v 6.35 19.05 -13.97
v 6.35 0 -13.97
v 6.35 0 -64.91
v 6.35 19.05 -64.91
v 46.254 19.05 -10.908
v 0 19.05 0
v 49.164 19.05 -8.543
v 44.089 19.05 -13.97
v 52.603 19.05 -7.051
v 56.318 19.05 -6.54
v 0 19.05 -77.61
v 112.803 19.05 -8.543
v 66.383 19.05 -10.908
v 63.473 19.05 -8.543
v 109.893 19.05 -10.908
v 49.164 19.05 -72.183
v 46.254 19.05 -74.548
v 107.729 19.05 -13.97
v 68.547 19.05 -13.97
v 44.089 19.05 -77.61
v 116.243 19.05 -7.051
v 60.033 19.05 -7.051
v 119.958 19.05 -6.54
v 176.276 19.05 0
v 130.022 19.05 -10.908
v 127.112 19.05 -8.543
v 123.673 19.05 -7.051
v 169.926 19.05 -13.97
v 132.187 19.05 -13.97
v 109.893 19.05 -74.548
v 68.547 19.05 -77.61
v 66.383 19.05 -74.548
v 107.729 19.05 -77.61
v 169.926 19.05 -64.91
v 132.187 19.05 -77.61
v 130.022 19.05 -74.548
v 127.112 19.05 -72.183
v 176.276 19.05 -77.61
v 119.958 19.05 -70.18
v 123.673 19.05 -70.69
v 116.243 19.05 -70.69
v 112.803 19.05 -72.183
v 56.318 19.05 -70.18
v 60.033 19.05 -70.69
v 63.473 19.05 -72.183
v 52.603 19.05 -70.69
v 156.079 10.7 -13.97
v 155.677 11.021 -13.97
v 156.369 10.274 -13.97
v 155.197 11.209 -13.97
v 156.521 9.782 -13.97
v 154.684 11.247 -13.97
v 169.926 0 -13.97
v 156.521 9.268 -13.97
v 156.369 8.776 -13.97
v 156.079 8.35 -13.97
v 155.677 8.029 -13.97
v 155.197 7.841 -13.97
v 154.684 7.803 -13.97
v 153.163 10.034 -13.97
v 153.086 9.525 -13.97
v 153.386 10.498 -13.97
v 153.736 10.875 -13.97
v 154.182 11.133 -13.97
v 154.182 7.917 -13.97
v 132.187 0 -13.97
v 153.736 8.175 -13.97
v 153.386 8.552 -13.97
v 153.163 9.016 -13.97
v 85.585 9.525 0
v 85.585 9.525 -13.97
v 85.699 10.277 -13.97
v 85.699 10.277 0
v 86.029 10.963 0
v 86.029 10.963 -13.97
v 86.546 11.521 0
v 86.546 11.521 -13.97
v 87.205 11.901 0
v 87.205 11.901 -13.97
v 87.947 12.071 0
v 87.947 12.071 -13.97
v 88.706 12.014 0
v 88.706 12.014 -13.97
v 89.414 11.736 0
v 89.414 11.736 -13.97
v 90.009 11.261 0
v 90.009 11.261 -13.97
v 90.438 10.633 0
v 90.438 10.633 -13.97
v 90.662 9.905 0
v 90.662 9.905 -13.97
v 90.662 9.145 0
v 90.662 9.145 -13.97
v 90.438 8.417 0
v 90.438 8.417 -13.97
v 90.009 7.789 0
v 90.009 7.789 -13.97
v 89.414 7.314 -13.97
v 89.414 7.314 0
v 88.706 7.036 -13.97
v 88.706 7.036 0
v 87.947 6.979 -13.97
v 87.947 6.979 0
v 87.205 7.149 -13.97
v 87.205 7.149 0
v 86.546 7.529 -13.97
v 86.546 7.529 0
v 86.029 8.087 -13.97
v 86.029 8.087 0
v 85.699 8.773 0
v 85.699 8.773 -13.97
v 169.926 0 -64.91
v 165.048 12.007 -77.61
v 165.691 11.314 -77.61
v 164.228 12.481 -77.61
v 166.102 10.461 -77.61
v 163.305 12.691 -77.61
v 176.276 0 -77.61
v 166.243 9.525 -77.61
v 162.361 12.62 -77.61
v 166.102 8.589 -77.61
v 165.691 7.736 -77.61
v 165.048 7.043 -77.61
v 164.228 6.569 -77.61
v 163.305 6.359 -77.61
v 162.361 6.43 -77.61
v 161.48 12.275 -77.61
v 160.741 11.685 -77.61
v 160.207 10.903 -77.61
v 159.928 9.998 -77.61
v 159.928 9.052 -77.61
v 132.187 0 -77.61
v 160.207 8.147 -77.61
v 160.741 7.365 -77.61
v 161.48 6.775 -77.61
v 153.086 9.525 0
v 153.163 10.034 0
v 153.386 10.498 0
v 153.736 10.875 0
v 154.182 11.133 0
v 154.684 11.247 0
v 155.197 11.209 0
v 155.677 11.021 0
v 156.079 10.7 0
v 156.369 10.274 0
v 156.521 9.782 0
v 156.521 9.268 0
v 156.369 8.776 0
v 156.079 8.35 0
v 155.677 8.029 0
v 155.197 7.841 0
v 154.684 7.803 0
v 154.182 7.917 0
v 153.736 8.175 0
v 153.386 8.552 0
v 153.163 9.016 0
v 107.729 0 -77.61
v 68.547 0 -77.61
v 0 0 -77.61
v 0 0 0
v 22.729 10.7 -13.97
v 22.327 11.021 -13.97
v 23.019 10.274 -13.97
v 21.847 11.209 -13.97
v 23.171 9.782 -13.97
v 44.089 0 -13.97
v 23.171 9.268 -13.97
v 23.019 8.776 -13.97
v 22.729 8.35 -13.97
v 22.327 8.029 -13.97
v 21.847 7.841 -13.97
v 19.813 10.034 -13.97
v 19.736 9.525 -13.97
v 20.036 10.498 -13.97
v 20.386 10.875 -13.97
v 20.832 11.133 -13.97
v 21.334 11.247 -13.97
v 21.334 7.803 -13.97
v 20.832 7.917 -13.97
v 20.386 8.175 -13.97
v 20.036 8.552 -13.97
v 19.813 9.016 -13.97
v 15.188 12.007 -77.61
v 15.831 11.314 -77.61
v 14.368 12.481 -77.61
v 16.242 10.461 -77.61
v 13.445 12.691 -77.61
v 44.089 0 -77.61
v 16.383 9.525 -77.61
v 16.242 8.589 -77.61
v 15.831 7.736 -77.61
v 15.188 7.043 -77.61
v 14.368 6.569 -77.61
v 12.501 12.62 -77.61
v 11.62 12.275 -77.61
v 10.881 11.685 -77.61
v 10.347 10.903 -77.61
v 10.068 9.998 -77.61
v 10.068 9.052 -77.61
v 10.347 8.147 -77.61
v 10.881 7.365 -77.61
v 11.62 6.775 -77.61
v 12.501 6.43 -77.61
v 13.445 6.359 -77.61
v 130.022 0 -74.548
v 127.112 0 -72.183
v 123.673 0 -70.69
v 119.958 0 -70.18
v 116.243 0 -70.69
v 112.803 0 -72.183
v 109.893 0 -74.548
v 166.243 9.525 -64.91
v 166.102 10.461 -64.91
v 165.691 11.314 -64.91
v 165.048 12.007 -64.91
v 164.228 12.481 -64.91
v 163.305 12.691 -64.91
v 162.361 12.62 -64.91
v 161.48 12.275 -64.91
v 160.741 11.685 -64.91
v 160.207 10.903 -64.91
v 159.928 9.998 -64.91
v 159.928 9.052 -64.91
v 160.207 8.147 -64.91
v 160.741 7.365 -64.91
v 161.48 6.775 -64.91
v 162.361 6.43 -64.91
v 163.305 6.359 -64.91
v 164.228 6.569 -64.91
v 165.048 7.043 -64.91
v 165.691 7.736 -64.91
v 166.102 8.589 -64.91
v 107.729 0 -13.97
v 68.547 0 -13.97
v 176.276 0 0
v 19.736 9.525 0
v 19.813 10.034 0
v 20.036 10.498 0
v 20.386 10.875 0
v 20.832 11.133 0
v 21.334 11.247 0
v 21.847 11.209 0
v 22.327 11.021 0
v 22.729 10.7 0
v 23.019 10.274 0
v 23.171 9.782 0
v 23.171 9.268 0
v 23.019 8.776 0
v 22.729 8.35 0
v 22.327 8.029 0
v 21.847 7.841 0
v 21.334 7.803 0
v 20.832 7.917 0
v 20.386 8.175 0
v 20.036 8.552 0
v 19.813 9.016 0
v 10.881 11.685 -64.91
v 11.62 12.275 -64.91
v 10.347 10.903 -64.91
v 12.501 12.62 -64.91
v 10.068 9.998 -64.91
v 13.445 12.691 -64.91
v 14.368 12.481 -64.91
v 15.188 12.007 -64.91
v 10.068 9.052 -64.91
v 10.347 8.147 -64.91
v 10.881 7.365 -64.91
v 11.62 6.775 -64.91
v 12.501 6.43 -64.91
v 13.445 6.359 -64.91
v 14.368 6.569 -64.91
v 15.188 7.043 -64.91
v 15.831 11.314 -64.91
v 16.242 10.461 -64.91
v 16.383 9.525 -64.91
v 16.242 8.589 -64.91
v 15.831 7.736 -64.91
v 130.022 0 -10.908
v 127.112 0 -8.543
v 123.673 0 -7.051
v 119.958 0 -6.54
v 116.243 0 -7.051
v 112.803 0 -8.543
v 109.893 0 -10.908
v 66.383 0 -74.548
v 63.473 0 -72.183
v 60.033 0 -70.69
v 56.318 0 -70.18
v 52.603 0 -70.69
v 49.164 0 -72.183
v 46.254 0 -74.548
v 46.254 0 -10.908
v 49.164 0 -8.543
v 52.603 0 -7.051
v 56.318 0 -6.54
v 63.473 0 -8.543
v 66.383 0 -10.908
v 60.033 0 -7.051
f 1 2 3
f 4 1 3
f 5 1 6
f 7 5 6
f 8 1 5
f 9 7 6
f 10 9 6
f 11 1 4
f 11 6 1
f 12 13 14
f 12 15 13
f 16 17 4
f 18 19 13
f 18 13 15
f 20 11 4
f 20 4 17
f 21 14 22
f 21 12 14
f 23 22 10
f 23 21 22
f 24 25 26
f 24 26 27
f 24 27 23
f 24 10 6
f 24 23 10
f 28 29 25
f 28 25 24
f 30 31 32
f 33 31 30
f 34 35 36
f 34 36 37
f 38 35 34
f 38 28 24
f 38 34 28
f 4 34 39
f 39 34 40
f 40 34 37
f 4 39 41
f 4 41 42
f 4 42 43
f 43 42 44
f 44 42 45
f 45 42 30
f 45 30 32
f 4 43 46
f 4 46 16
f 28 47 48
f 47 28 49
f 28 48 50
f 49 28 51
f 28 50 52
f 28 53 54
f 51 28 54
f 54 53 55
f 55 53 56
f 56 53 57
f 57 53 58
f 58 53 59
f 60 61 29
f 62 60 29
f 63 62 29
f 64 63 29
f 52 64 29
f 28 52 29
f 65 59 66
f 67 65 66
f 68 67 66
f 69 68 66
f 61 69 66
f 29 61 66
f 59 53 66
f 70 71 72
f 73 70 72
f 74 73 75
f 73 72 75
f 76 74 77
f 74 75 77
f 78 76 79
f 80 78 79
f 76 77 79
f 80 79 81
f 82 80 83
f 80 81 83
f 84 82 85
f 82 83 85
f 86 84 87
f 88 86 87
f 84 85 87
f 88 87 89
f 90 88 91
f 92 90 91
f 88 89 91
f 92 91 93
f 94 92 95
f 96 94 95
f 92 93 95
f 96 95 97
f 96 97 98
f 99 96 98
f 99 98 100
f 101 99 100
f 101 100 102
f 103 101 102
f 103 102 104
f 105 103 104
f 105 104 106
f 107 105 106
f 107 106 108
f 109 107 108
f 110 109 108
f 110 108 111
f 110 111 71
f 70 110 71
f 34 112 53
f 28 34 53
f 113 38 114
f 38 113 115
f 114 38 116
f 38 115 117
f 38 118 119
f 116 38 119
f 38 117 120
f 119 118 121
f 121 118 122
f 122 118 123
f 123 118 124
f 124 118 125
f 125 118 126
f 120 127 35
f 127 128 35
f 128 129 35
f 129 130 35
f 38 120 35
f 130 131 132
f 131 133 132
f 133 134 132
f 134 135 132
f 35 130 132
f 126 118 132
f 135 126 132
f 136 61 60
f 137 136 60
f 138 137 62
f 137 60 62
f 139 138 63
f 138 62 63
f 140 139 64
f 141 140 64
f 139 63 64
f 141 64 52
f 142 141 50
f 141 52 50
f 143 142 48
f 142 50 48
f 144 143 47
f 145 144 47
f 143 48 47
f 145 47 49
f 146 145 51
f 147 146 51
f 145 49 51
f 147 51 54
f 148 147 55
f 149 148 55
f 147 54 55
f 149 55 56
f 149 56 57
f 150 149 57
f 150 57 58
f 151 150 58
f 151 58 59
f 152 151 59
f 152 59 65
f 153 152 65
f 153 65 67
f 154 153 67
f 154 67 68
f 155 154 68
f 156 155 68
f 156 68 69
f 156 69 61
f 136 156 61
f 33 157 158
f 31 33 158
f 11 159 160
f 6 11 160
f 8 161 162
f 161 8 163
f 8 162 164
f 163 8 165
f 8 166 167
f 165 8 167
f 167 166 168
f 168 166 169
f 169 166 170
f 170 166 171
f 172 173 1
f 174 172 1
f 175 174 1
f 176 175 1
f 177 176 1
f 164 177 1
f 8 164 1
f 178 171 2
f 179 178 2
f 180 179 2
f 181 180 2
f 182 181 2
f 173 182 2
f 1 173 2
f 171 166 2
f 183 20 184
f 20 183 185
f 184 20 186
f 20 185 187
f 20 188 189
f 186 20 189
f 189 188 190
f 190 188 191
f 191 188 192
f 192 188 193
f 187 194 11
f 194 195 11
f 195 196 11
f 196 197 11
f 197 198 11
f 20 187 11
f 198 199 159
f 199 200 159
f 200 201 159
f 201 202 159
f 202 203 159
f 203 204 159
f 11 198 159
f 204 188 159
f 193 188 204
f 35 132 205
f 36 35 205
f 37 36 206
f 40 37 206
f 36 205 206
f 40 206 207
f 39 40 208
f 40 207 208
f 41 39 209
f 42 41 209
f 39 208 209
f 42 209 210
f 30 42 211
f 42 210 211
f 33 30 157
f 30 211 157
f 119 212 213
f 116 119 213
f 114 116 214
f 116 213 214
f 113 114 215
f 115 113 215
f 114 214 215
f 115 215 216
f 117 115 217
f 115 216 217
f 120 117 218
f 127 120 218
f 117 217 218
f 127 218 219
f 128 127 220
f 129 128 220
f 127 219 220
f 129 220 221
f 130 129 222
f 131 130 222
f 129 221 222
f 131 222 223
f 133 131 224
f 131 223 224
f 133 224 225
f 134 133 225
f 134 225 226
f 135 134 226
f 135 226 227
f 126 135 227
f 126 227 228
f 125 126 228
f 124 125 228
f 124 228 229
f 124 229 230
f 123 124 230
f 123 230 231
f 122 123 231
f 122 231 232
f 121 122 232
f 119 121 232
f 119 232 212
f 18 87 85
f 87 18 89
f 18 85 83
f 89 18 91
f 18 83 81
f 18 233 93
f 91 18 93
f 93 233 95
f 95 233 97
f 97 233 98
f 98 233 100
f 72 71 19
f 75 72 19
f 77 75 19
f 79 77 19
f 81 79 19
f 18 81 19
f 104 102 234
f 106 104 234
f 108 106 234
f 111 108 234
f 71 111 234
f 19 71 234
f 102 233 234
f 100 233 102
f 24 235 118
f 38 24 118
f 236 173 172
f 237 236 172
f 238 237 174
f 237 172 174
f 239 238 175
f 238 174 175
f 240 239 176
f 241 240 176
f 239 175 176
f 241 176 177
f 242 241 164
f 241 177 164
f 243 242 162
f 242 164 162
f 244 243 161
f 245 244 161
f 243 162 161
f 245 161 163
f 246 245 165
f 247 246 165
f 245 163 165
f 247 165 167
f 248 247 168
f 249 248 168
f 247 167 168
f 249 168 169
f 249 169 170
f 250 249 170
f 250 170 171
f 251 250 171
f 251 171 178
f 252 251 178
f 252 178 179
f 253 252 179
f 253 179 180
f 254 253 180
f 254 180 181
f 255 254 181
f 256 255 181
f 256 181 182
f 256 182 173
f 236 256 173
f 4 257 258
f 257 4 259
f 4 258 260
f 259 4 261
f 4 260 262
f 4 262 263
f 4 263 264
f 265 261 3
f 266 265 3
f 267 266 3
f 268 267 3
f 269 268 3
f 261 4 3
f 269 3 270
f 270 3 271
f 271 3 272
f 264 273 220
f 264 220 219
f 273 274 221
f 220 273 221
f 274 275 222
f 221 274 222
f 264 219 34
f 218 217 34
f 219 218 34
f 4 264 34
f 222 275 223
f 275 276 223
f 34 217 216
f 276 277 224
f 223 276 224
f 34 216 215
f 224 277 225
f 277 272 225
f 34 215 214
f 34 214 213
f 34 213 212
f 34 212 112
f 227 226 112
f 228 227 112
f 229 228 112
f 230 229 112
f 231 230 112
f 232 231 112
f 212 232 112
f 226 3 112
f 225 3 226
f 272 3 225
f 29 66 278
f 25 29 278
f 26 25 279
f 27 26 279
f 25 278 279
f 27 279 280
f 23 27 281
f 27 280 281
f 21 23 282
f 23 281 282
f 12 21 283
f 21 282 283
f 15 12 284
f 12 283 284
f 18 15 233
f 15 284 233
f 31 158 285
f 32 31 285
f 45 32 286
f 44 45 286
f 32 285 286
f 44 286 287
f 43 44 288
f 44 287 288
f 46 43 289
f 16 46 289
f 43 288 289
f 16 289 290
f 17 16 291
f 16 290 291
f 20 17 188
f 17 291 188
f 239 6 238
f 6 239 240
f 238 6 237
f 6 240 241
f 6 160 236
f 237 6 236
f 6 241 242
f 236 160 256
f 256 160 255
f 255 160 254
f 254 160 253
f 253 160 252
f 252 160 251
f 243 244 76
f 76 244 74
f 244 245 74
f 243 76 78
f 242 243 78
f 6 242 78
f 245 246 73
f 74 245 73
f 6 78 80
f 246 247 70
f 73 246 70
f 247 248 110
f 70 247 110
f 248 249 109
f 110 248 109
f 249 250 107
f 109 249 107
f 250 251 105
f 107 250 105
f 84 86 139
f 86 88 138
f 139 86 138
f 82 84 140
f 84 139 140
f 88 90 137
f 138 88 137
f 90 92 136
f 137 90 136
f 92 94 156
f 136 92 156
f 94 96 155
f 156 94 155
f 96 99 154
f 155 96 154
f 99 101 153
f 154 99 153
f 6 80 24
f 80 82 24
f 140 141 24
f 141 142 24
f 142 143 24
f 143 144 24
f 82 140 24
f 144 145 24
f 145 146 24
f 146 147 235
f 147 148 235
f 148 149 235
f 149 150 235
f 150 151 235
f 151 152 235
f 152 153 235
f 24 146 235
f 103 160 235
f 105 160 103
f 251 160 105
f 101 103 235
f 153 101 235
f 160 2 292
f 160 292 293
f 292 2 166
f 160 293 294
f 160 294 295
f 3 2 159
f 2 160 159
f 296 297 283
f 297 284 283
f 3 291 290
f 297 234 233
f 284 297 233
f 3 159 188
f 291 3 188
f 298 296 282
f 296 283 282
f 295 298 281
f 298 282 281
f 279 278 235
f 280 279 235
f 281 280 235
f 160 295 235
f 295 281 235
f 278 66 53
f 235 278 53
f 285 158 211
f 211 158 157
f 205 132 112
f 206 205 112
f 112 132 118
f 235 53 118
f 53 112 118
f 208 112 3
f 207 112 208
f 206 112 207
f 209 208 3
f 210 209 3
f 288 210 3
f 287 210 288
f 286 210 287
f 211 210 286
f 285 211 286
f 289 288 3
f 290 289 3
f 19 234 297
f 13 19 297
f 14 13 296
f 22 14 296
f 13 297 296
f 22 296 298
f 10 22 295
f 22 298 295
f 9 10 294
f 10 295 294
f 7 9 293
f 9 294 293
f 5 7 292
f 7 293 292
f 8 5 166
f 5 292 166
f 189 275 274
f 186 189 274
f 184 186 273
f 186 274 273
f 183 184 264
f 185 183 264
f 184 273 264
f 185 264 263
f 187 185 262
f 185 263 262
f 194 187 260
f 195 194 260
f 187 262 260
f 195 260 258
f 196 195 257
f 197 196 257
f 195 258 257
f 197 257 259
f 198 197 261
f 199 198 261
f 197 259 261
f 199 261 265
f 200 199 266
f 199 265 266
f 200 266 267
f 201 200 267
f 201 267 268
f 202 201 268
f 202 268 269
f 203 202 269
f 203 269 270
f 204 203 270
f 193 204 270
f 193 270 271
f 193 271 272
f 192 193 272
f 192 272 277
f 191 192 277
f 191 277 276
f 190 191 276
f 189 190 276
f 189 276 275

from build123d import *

# Parameters (mm, degrees)
BOSS_EXTRUDE1_DEPTH            = 19.05
F_8_32_TAPPED_HOLE1_D          = 3.4544
F_8_32_TAPPED_HOLE1_DEPTH      = 13.97
F_10_CLEARANCE_HOLE1_D         = 5.1054
F_10_CLEARANCE_HOLE1_DEPTH     = 13.97
F_1_4_0_2500_DOWEL_HOLE2_D     = 6.35
F_1_4_0_2500_DOWEL_HOLE2_DEPTH = 12.7


with BuildPart() as part:
    # Sketch1 → Boss-Extrude1 (new body)
    with BuildSketch(Plane(origin=(0, 0, 0), x_dir=(1, 0, 0), z_dir=(0, 1, 0))):
        with BuildLine():
            Line((107.72869957, 77.6097), (68.54730043, 77.6097))
            ThreePointArc((68.54730043, 77.6097), (56.31815, 70.1802), (44.08899957, 77.6097))
            Line((44.08899957, 77.6097), (0, 77.6097))
            Line((0, 77.6097), (0, 0))
            Line((0, 0), (176.276, 0))
            Line((176.276, 0), (176.276, 77.6097))
            Line((176.276, 77.6097), (132.18700043, 77.6097))
            ThreePointArc((132.18700043, 77.6097), (119.95785, 70.1802), (107.72869957, 77.6097))
        make_face()
        with BuildLine():
            Line((169.926, 13.97), (132.18700043, 13.97))
            ThreePointArc((132.18700043, 13.97), (119.95785, 6.5405), (107.72869957, 13.97))
            Line((107.72869957, 13.97), (68.54730043, 13.97))
            ThreePointArc((68.54730043, 13.97), (56.31815, 6.5405), (44.08899957, 13.97))
            Line((44.08899957, 13.97), (6.35, 13.97))
            Line((6.35, 13.97), (6.35, 64.9097))
            Line((6.35, 64.9097), (169.926, 64.9097))
            Line((169.926, 64.9097), (169.926, 13.97))
        make_face(mode=Mode.SUBTRACT)
    extrude(amount=BOSS_EXTRUDE1_DEPTH)

    # #8-32 Tapped Hole1
    with Locations(Plane.XY):
        with Locations((154.813, 9.525), (21.463, 9.525)):
            Hole(F_8_32_TAPPED_HOLE1_D / 2, depth=F_8_32_TAPPED_HOLE1_DEPTH)

    # #10 Clearance Hole1
    with Locations(Plane.XY):
        with Locations((88.138, 9.525)):
            Hole(F_10_CLEARANCE_HOLE1_D / 2, depth=F_10_CLEARANCE_HOLE1_DEPTH)

    # 1/4 (0.2500) Dowel Hole2
    with Locations(Plane(origin=(0, 0, -77.6097), x_dir=(-1, 0, 0), z_dir=(0, 0, -1))):
        with Locations((-13.208, 9.525), (-163.068, 9.525)):
            Hole(F_1_4_0_2500_DOWEL_HOLE2_D / 2, depth=F_1_4_0_2500_DOWEL_HOLE2_DEPTH)


solid = part.part
